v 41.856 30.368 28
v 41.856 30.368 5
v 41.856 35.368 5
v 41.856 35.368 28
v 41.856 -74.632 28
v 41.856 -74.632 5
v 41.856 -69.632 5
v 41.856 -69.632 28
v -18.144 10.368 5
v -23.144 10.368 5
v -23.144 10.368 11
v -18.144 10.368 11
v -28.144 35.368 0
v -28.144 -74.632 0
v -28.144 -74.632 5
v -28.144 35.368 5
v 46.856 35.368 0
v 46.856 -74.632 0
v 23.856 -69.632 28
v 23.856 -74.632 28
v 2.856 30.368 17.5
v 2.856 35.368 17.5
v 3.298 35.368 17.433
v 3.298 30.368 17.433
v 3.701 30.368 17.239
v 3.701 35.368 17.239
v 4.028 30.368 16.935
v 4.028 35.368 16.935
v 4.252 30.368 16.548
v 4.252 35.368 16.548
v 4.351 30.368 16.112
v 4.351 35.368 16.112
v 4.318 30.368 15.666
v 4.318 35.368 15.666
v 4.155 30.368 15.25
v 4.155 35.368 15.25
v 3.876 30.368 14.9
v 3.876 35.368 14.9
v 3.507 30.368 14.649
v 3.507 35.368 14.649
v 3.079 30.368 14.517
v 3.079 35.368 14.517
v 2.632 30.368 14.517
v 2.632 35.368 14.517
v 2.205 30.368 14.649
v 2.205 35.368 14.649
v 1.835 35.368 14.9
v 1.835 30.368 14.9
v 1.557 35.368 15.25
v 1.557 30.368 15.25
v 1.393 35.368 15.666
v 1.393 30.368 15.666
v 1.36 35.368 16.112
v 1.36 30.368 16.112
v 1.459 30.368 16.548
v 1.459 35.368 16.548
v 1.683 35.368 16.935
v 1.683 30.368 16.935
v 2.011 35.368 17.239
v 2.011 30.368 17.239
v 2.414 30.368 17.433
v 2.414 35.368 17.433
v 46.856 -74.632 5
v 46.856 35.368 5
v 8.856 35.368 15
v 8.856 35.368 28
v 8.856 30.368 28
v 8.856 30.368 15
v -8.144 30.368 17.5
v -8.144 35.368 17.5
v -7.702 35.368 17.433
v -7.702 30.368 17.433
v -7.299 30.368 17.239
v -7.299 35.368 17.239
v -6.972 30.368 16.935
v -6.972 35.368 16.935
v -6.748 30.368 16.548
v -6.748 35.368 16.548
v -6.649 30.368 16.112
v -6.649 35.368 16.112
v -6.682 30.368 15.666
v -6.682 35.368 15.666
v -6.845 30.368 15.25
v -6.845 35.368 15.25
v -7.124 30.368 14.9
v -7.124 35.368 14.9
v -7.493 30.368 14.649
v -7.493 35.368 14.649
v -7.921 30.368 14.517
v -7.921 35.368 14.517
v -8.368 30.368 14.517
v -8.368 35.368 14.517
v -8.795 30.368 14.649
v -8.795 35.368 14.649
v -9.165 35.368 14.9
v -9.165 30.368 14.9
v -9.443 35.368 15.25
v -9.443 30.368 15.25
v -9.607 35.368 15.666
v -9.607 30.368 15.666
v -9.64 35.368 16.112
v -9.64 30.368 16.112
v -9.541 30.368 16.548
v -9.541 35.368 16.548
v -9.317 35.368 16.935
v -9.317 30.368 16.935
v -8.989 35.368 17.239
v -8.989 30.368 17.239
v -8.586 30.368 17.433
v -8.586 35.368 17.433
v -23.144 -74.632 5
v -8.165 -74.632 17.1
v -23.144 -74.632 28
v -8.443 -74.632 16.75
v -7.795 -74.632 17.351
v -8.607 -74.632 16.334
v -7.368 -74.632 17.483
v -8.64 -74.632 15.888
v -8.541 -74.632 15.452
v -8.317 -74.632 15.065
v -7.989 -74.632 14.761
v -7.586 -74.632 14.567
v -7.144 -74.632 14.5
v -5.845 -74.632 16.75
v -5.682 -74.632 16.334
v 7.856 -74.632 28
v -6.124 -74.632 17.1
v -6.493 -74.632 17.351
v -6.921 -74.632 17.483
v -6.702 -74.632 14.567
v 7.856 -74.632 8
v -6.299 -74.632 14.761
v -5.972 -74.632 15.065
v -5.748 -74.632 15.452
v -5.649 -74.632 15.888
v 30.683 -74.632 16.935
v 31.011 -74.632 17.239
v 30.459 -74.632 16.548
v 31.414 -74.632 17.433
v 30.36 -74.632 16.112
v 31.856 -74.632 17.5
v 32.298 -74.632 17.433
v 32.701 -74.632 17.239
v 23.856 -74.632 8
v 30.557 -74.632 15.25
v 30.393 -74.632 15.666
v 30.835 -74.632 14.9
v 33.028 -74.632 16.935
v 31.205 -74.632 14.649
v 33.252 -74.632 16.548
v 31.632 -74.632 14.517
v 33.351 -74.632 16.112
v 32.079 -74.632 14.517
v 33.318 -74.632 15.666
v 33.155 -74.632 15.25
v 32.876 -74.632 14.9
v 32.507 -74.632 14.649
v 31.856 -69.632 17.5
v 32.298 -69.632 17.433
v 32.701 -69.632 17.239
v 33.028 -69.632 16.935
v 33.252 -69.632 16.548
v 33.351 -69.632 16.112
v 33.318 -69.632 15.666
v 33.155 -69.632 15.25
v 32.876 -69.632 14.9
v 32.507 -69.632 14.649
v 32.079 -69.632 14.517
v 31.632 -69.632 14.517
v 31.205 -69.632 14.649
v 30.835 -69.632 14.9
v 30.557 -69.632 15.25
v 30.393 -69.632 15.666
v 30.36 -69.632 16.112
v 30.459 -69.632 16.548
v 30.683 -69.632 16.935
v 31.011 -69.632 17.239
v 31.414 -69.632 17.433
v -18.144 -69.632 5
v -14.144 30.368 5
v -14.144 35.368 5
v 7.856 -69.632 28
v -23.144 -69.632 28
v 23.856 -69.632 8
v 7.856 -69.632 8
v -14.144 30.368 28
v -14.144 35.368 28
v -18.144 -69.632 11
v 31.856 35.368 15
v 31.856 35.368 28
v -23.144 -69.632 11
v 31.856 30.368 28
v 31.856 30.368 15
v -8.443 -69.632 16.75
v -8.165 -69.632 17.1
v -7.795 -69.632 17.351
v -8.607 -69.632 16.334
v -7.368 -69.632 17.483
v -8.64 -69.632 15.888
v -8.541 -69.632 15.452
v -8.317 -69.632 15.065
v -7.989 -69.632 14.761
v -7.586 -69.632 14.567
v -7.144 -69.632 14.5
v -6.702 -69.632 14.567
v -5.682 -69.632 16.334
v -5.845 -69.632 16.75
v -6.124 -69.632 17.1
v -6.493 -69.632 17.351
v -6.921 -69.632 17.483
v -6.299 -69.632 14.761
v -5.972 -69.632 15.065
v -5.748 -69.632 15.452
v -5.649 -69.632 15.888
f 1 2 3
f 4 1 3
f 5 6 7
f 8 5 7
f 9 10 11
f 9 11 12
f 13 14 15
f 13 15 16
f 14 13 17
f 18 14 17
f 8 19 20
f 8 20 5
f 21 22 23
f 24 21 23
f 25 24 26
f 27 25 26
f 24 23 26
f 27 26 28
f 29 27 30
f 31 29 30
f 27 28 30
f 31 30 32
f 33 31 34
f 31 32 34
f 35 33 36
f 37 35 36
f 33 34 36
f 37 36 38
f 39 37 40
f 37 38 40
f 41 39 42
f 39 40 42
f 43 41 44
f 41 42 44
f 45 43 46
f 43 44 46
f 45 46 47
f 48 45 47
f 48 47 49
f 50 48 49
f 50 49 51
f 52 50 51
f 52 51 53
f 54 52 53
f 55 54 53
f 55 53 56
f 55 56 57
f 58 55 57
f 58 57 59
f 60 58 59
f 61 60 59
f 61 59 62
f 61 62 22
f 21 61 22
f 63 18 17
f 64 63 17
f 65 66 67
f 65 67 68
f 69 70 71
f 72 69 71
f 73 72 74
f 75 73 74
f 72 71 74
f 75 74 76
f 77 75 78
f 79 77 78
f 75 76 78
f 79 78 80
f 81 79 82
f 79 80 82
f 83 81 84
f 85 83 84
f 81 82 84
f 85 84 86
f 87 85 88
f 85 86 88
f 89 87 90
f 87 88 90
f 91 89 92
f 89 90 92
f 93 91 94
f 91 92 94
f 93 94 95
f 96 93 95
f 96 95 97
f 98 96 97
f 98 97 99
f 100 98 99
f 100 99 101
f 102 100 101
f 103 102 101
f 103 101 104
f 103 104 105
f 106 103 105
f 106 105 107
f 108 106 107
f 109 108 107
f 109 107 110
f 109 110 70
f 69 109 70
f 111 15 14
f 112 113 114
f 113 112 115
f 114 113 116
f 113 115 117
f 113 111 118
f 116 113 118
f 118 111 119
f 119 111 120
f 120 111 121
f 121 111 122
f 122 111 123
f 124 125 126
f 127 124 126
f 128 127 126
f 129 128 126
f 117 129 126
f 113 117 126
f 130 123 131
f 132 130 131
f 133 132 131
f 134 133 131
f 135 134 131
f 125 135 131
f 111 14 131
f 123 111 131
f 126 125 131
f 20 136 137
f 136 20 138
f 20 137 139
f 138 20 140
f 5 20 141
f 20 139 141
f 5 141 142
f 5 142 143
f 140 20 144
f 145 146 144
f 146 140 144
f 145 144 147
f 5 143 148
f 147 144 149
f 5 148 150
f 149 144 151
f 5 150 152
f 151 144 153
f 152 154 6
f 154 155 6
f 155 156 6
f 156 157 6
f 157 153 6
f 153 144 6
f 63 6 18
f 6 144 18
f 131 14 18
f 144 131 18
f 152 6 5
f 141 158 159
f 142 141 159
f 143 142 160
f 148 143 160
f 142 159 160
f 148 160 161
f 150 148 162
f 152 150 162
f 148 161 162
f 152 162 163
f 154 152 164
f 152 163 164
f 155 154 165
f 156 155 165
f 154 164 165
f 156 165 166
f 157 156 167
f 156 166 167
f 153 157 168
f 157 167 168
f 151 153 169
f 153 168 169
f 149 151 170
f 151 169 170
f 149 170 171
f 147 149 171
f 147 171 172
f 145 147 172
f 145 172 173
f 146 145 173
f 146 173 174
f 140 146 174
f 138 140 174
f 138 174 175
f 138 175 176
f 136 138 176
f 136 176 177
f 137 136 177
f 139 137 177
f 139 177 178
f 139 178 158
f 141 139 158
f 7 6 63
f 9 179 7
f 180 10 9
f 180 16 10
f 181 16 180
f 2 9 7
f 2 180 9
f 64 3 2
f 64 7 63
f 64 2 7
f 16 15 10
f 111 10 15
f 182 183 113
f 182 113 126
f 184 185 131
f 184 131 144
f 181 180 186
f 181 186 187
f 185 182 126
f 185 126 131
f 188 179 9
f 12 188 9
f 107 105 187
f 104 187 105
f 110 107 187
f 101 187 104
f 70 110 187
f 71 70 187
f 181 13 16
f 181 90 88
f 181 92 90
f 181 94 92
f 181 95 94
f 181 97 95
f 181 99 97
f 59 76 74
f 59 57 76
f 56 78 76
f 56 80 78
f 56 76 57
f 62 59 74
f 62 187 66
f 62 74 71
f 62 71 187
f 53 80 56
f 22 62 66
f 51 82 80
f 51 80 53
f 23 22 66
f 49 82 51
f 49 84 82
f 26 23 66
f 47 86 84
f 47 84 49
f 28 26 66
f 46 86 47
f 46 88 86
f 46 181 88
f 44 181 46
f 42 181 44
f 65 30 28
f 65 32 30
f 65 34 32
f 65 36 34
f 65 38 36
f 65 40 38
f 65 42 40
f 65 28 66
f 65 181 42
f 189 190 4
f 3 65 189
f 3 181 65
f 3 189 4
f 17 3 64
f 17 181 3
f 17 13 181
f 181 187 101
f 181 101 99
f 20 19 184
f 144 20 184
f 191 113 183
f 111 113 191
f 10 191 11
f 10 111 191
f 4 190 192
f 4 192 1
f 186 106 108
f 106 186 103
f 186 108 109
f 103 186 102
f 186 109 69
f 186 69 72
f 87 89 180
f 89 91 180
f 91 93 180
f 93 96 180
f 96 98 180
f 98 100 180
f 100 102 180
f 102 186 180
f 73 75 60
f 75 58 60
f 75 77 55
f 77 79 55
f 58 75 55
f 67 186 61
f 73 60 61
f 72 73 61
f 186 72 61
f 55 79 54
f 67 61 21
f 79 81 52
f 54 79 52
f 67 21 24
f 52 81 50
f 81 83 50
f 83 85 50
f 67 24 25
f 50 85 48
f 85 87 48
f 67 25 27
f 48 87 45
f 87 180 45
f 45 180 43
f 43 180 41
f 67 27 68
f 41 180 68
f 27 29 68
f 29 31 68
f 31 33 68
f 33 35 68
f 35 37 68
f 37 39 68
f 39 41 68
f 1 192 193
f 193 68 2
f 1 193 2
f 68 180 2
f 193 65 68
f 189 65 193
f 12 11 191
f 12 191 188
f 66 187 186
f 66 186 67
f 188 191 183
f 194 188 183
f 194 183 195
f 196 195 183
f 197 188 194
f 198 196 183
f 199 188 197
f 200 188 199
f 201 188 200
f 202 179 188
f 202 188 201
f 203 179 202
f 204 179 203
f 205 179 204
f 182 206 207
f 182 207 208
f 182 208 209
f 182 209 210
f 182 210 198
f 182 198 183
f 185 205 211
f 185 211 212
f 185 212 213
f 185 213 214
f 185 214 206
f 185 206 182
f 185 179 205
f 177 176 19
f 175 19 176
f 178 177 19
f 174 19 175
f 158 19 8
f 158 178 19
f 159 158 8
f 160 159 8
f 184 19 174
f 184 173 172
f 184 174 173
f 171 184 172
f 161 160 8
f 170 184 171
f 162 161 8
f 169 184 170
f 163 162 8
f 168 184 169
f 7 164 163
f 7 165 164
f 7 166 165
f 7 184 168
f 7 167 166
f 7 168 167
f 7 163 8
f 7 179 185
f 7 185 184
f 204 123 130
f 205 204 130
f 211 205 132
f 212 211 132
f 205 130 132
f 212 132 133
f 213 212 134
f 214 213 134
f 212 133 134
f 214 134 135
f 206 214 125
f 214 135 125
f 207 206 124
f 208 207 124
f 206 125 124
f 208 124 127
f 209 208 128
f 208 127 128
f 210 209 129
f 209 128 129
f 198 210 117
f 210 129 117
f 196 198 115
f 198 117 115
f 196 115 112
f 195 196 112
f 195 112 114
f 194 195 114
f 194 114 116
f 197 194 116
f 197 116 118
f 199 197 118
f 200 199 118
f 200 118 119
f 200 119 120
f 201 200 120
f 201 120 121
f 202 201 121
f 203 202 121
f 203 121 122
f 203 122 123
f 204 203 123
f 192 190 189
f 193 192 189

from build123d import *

# Parameters (mm, degrees)
SKETCH_1_W          = 75
SKETCH_1_H          = 110
EXTRUDE_1_DEPTH     = 5
SKETCH_2_W          = 65
SKETCH_2_H          = 5
SKETCH_2_W_2        = 56
EXTRUDE_2_DEPTH     = 23
SKETCH_3_R          = 1.5
SKETCH_3_W          = 23
SKETCH_3_H          = 13
CUT_EXTRUDE_1_DEPTH = 10
CUT_EXTRUDE_2_REACH = 120.34
SKETCH_5_W          = 16
SKETCH_5_H          = 20
CUT_EXTRUDE_3_REACH = 120.34
SKETCH_6_R          = 1.5
CUT_EXTRUDE_4_REACH = 124.798
SKETCH_7_R          = 1.5
SKETCH_8_W          = 5
SKETCH_8_H          = 80
EXTRUDE_3_DEPTH     = 6


with BuildPart() as part:
    # 草圖1 → 填料-伸長1 (new body)
    with BuildSketch(Plane.XY):
        with Locations((9.355675066, -19.631766382)):
            Rectangle(SKETCH_1_W, SKETCH_1_H)
    extrude(amount=EXTRUDE_1_DEPTH)

    # 草圖2 → 填料-伸長2 (add)
    with BuildSketch(Plane.XY.offset(5)):
        with Locations((9.355675066, -72.131766382)):
            Rectangle(SKETCH_2_W, SKETCH_2_H)
        with Locations((13.855675066, 32.868233618)):
            Rectangle(SKETCH_2_W_2, SKETCH_2_H)
    extrude(amount=EXTRUDE_2_DEPTH)

    # 草圖3 → 除料-伸長1 (cut)
    with BuildSketch(Plane(origin=(0, 35.368233618, 0), x_dir=(1, 0, 0), z_dir=(0, 1, 0))):
        with Locations(Location((2.855675066, -16, 0), (0, 0, 270))):
            Circle(SKETCH_3_R)
        with Locations(Location((-8.144324934, -16, 0), (0, 0, 270))):
            Circle(SKETCH_3_R)
        with Locations((20.355675066, -21.5)):
            Rectangle(SKETCH_3_W, SKETCH_3_H)
    extrude(amount=-CUT_EXTRUDE_1_DEPTH, mode=Mode.SUBTRACT)

    # 草圖5 → 除料-伸長2 (cut, up to next)
    with BuildSketch(Plane(origin=(0, -69.631766382, 0), x_dir=(1, 0, 0), z_dir=(0, 1, 0)), mode=Mode.PRIVATE) as cut_extrude_2_sk1:
        with Locations((15.855675066, -18)):
            Rectangle(SKETCH_5_W, SKETCH_5_H)
    cut_extrude_2_tool1 = extrude(cut_extrude_2_sk1.sketch, amount=-CUT_EXTRUDE_2_REACH, mode=Mode.PRIVATE) & part.part
    add(cut_extrude_2_tool1.solids().sort_by_distance((15.855675, -69.631766, 18))[0], mode=Mode.SUBTRACT)

    # 草圖6 → 除料-伸長3 (cut, up to next)
    with BuildSketch(Plane(origin=(0, -69.631766382, 0), x_dir=(1, 0, 0), z_dir=(0, 1, 0)), mode=Mode.PRIVATE) as cut_extrude_3_sk1:
        with Locations(Location((31.855675066, -16, 0), (0, 0, 270))):
            Circle(SKETCH_6_R)
    cut_extrude_3_tool1 = extrude(cut_extrude_3_sk1.sketch, amount=-CUT_EXTRUDE_3_REACH, mode=Mode.PRIVATE) & part.part
    add(cut_extrude_3_tool1.solids().sort_by_distance((31.855675, -69.631766, 16))[0], mode=Mode.SUBTRACT)

    # 草圖7 → 除料-伸長4 (cut, up to next)
    with BuildSketch(Plane.XZ.offset(74.631766382), mode=Mode.PRIVATE) as cut_extrude_4_sk1:
        with Locations(Location((-7.144324934, 16, 0), (0, 0, 270))):
            Circle(SKETCH_7_R)
    cut_extrude_4_tool1 = extrude(cut_extrude_4_sk1.sketch, amount=-CUT_EXTRUDE_4_REACH, mode=Mode.PRIVATE) & part.part
    add(cut_extrude_4_tool1.solids().sort_by_distance((-7.144325, -74.631766, 16))[0], mode=Mode.SUBTRACT)

    # 草圖8 → 填料-伸長3 (add)
    with BuildSketch(Plane.XY.offset(5)):
        with Locations((-20.644324934, -29.631766382)):
            Rectangle(SKETCH_8_W, SKETCH_8_H)
    extrude(amount=EXTRUDE_3_DEPTH)


solid = part.part
